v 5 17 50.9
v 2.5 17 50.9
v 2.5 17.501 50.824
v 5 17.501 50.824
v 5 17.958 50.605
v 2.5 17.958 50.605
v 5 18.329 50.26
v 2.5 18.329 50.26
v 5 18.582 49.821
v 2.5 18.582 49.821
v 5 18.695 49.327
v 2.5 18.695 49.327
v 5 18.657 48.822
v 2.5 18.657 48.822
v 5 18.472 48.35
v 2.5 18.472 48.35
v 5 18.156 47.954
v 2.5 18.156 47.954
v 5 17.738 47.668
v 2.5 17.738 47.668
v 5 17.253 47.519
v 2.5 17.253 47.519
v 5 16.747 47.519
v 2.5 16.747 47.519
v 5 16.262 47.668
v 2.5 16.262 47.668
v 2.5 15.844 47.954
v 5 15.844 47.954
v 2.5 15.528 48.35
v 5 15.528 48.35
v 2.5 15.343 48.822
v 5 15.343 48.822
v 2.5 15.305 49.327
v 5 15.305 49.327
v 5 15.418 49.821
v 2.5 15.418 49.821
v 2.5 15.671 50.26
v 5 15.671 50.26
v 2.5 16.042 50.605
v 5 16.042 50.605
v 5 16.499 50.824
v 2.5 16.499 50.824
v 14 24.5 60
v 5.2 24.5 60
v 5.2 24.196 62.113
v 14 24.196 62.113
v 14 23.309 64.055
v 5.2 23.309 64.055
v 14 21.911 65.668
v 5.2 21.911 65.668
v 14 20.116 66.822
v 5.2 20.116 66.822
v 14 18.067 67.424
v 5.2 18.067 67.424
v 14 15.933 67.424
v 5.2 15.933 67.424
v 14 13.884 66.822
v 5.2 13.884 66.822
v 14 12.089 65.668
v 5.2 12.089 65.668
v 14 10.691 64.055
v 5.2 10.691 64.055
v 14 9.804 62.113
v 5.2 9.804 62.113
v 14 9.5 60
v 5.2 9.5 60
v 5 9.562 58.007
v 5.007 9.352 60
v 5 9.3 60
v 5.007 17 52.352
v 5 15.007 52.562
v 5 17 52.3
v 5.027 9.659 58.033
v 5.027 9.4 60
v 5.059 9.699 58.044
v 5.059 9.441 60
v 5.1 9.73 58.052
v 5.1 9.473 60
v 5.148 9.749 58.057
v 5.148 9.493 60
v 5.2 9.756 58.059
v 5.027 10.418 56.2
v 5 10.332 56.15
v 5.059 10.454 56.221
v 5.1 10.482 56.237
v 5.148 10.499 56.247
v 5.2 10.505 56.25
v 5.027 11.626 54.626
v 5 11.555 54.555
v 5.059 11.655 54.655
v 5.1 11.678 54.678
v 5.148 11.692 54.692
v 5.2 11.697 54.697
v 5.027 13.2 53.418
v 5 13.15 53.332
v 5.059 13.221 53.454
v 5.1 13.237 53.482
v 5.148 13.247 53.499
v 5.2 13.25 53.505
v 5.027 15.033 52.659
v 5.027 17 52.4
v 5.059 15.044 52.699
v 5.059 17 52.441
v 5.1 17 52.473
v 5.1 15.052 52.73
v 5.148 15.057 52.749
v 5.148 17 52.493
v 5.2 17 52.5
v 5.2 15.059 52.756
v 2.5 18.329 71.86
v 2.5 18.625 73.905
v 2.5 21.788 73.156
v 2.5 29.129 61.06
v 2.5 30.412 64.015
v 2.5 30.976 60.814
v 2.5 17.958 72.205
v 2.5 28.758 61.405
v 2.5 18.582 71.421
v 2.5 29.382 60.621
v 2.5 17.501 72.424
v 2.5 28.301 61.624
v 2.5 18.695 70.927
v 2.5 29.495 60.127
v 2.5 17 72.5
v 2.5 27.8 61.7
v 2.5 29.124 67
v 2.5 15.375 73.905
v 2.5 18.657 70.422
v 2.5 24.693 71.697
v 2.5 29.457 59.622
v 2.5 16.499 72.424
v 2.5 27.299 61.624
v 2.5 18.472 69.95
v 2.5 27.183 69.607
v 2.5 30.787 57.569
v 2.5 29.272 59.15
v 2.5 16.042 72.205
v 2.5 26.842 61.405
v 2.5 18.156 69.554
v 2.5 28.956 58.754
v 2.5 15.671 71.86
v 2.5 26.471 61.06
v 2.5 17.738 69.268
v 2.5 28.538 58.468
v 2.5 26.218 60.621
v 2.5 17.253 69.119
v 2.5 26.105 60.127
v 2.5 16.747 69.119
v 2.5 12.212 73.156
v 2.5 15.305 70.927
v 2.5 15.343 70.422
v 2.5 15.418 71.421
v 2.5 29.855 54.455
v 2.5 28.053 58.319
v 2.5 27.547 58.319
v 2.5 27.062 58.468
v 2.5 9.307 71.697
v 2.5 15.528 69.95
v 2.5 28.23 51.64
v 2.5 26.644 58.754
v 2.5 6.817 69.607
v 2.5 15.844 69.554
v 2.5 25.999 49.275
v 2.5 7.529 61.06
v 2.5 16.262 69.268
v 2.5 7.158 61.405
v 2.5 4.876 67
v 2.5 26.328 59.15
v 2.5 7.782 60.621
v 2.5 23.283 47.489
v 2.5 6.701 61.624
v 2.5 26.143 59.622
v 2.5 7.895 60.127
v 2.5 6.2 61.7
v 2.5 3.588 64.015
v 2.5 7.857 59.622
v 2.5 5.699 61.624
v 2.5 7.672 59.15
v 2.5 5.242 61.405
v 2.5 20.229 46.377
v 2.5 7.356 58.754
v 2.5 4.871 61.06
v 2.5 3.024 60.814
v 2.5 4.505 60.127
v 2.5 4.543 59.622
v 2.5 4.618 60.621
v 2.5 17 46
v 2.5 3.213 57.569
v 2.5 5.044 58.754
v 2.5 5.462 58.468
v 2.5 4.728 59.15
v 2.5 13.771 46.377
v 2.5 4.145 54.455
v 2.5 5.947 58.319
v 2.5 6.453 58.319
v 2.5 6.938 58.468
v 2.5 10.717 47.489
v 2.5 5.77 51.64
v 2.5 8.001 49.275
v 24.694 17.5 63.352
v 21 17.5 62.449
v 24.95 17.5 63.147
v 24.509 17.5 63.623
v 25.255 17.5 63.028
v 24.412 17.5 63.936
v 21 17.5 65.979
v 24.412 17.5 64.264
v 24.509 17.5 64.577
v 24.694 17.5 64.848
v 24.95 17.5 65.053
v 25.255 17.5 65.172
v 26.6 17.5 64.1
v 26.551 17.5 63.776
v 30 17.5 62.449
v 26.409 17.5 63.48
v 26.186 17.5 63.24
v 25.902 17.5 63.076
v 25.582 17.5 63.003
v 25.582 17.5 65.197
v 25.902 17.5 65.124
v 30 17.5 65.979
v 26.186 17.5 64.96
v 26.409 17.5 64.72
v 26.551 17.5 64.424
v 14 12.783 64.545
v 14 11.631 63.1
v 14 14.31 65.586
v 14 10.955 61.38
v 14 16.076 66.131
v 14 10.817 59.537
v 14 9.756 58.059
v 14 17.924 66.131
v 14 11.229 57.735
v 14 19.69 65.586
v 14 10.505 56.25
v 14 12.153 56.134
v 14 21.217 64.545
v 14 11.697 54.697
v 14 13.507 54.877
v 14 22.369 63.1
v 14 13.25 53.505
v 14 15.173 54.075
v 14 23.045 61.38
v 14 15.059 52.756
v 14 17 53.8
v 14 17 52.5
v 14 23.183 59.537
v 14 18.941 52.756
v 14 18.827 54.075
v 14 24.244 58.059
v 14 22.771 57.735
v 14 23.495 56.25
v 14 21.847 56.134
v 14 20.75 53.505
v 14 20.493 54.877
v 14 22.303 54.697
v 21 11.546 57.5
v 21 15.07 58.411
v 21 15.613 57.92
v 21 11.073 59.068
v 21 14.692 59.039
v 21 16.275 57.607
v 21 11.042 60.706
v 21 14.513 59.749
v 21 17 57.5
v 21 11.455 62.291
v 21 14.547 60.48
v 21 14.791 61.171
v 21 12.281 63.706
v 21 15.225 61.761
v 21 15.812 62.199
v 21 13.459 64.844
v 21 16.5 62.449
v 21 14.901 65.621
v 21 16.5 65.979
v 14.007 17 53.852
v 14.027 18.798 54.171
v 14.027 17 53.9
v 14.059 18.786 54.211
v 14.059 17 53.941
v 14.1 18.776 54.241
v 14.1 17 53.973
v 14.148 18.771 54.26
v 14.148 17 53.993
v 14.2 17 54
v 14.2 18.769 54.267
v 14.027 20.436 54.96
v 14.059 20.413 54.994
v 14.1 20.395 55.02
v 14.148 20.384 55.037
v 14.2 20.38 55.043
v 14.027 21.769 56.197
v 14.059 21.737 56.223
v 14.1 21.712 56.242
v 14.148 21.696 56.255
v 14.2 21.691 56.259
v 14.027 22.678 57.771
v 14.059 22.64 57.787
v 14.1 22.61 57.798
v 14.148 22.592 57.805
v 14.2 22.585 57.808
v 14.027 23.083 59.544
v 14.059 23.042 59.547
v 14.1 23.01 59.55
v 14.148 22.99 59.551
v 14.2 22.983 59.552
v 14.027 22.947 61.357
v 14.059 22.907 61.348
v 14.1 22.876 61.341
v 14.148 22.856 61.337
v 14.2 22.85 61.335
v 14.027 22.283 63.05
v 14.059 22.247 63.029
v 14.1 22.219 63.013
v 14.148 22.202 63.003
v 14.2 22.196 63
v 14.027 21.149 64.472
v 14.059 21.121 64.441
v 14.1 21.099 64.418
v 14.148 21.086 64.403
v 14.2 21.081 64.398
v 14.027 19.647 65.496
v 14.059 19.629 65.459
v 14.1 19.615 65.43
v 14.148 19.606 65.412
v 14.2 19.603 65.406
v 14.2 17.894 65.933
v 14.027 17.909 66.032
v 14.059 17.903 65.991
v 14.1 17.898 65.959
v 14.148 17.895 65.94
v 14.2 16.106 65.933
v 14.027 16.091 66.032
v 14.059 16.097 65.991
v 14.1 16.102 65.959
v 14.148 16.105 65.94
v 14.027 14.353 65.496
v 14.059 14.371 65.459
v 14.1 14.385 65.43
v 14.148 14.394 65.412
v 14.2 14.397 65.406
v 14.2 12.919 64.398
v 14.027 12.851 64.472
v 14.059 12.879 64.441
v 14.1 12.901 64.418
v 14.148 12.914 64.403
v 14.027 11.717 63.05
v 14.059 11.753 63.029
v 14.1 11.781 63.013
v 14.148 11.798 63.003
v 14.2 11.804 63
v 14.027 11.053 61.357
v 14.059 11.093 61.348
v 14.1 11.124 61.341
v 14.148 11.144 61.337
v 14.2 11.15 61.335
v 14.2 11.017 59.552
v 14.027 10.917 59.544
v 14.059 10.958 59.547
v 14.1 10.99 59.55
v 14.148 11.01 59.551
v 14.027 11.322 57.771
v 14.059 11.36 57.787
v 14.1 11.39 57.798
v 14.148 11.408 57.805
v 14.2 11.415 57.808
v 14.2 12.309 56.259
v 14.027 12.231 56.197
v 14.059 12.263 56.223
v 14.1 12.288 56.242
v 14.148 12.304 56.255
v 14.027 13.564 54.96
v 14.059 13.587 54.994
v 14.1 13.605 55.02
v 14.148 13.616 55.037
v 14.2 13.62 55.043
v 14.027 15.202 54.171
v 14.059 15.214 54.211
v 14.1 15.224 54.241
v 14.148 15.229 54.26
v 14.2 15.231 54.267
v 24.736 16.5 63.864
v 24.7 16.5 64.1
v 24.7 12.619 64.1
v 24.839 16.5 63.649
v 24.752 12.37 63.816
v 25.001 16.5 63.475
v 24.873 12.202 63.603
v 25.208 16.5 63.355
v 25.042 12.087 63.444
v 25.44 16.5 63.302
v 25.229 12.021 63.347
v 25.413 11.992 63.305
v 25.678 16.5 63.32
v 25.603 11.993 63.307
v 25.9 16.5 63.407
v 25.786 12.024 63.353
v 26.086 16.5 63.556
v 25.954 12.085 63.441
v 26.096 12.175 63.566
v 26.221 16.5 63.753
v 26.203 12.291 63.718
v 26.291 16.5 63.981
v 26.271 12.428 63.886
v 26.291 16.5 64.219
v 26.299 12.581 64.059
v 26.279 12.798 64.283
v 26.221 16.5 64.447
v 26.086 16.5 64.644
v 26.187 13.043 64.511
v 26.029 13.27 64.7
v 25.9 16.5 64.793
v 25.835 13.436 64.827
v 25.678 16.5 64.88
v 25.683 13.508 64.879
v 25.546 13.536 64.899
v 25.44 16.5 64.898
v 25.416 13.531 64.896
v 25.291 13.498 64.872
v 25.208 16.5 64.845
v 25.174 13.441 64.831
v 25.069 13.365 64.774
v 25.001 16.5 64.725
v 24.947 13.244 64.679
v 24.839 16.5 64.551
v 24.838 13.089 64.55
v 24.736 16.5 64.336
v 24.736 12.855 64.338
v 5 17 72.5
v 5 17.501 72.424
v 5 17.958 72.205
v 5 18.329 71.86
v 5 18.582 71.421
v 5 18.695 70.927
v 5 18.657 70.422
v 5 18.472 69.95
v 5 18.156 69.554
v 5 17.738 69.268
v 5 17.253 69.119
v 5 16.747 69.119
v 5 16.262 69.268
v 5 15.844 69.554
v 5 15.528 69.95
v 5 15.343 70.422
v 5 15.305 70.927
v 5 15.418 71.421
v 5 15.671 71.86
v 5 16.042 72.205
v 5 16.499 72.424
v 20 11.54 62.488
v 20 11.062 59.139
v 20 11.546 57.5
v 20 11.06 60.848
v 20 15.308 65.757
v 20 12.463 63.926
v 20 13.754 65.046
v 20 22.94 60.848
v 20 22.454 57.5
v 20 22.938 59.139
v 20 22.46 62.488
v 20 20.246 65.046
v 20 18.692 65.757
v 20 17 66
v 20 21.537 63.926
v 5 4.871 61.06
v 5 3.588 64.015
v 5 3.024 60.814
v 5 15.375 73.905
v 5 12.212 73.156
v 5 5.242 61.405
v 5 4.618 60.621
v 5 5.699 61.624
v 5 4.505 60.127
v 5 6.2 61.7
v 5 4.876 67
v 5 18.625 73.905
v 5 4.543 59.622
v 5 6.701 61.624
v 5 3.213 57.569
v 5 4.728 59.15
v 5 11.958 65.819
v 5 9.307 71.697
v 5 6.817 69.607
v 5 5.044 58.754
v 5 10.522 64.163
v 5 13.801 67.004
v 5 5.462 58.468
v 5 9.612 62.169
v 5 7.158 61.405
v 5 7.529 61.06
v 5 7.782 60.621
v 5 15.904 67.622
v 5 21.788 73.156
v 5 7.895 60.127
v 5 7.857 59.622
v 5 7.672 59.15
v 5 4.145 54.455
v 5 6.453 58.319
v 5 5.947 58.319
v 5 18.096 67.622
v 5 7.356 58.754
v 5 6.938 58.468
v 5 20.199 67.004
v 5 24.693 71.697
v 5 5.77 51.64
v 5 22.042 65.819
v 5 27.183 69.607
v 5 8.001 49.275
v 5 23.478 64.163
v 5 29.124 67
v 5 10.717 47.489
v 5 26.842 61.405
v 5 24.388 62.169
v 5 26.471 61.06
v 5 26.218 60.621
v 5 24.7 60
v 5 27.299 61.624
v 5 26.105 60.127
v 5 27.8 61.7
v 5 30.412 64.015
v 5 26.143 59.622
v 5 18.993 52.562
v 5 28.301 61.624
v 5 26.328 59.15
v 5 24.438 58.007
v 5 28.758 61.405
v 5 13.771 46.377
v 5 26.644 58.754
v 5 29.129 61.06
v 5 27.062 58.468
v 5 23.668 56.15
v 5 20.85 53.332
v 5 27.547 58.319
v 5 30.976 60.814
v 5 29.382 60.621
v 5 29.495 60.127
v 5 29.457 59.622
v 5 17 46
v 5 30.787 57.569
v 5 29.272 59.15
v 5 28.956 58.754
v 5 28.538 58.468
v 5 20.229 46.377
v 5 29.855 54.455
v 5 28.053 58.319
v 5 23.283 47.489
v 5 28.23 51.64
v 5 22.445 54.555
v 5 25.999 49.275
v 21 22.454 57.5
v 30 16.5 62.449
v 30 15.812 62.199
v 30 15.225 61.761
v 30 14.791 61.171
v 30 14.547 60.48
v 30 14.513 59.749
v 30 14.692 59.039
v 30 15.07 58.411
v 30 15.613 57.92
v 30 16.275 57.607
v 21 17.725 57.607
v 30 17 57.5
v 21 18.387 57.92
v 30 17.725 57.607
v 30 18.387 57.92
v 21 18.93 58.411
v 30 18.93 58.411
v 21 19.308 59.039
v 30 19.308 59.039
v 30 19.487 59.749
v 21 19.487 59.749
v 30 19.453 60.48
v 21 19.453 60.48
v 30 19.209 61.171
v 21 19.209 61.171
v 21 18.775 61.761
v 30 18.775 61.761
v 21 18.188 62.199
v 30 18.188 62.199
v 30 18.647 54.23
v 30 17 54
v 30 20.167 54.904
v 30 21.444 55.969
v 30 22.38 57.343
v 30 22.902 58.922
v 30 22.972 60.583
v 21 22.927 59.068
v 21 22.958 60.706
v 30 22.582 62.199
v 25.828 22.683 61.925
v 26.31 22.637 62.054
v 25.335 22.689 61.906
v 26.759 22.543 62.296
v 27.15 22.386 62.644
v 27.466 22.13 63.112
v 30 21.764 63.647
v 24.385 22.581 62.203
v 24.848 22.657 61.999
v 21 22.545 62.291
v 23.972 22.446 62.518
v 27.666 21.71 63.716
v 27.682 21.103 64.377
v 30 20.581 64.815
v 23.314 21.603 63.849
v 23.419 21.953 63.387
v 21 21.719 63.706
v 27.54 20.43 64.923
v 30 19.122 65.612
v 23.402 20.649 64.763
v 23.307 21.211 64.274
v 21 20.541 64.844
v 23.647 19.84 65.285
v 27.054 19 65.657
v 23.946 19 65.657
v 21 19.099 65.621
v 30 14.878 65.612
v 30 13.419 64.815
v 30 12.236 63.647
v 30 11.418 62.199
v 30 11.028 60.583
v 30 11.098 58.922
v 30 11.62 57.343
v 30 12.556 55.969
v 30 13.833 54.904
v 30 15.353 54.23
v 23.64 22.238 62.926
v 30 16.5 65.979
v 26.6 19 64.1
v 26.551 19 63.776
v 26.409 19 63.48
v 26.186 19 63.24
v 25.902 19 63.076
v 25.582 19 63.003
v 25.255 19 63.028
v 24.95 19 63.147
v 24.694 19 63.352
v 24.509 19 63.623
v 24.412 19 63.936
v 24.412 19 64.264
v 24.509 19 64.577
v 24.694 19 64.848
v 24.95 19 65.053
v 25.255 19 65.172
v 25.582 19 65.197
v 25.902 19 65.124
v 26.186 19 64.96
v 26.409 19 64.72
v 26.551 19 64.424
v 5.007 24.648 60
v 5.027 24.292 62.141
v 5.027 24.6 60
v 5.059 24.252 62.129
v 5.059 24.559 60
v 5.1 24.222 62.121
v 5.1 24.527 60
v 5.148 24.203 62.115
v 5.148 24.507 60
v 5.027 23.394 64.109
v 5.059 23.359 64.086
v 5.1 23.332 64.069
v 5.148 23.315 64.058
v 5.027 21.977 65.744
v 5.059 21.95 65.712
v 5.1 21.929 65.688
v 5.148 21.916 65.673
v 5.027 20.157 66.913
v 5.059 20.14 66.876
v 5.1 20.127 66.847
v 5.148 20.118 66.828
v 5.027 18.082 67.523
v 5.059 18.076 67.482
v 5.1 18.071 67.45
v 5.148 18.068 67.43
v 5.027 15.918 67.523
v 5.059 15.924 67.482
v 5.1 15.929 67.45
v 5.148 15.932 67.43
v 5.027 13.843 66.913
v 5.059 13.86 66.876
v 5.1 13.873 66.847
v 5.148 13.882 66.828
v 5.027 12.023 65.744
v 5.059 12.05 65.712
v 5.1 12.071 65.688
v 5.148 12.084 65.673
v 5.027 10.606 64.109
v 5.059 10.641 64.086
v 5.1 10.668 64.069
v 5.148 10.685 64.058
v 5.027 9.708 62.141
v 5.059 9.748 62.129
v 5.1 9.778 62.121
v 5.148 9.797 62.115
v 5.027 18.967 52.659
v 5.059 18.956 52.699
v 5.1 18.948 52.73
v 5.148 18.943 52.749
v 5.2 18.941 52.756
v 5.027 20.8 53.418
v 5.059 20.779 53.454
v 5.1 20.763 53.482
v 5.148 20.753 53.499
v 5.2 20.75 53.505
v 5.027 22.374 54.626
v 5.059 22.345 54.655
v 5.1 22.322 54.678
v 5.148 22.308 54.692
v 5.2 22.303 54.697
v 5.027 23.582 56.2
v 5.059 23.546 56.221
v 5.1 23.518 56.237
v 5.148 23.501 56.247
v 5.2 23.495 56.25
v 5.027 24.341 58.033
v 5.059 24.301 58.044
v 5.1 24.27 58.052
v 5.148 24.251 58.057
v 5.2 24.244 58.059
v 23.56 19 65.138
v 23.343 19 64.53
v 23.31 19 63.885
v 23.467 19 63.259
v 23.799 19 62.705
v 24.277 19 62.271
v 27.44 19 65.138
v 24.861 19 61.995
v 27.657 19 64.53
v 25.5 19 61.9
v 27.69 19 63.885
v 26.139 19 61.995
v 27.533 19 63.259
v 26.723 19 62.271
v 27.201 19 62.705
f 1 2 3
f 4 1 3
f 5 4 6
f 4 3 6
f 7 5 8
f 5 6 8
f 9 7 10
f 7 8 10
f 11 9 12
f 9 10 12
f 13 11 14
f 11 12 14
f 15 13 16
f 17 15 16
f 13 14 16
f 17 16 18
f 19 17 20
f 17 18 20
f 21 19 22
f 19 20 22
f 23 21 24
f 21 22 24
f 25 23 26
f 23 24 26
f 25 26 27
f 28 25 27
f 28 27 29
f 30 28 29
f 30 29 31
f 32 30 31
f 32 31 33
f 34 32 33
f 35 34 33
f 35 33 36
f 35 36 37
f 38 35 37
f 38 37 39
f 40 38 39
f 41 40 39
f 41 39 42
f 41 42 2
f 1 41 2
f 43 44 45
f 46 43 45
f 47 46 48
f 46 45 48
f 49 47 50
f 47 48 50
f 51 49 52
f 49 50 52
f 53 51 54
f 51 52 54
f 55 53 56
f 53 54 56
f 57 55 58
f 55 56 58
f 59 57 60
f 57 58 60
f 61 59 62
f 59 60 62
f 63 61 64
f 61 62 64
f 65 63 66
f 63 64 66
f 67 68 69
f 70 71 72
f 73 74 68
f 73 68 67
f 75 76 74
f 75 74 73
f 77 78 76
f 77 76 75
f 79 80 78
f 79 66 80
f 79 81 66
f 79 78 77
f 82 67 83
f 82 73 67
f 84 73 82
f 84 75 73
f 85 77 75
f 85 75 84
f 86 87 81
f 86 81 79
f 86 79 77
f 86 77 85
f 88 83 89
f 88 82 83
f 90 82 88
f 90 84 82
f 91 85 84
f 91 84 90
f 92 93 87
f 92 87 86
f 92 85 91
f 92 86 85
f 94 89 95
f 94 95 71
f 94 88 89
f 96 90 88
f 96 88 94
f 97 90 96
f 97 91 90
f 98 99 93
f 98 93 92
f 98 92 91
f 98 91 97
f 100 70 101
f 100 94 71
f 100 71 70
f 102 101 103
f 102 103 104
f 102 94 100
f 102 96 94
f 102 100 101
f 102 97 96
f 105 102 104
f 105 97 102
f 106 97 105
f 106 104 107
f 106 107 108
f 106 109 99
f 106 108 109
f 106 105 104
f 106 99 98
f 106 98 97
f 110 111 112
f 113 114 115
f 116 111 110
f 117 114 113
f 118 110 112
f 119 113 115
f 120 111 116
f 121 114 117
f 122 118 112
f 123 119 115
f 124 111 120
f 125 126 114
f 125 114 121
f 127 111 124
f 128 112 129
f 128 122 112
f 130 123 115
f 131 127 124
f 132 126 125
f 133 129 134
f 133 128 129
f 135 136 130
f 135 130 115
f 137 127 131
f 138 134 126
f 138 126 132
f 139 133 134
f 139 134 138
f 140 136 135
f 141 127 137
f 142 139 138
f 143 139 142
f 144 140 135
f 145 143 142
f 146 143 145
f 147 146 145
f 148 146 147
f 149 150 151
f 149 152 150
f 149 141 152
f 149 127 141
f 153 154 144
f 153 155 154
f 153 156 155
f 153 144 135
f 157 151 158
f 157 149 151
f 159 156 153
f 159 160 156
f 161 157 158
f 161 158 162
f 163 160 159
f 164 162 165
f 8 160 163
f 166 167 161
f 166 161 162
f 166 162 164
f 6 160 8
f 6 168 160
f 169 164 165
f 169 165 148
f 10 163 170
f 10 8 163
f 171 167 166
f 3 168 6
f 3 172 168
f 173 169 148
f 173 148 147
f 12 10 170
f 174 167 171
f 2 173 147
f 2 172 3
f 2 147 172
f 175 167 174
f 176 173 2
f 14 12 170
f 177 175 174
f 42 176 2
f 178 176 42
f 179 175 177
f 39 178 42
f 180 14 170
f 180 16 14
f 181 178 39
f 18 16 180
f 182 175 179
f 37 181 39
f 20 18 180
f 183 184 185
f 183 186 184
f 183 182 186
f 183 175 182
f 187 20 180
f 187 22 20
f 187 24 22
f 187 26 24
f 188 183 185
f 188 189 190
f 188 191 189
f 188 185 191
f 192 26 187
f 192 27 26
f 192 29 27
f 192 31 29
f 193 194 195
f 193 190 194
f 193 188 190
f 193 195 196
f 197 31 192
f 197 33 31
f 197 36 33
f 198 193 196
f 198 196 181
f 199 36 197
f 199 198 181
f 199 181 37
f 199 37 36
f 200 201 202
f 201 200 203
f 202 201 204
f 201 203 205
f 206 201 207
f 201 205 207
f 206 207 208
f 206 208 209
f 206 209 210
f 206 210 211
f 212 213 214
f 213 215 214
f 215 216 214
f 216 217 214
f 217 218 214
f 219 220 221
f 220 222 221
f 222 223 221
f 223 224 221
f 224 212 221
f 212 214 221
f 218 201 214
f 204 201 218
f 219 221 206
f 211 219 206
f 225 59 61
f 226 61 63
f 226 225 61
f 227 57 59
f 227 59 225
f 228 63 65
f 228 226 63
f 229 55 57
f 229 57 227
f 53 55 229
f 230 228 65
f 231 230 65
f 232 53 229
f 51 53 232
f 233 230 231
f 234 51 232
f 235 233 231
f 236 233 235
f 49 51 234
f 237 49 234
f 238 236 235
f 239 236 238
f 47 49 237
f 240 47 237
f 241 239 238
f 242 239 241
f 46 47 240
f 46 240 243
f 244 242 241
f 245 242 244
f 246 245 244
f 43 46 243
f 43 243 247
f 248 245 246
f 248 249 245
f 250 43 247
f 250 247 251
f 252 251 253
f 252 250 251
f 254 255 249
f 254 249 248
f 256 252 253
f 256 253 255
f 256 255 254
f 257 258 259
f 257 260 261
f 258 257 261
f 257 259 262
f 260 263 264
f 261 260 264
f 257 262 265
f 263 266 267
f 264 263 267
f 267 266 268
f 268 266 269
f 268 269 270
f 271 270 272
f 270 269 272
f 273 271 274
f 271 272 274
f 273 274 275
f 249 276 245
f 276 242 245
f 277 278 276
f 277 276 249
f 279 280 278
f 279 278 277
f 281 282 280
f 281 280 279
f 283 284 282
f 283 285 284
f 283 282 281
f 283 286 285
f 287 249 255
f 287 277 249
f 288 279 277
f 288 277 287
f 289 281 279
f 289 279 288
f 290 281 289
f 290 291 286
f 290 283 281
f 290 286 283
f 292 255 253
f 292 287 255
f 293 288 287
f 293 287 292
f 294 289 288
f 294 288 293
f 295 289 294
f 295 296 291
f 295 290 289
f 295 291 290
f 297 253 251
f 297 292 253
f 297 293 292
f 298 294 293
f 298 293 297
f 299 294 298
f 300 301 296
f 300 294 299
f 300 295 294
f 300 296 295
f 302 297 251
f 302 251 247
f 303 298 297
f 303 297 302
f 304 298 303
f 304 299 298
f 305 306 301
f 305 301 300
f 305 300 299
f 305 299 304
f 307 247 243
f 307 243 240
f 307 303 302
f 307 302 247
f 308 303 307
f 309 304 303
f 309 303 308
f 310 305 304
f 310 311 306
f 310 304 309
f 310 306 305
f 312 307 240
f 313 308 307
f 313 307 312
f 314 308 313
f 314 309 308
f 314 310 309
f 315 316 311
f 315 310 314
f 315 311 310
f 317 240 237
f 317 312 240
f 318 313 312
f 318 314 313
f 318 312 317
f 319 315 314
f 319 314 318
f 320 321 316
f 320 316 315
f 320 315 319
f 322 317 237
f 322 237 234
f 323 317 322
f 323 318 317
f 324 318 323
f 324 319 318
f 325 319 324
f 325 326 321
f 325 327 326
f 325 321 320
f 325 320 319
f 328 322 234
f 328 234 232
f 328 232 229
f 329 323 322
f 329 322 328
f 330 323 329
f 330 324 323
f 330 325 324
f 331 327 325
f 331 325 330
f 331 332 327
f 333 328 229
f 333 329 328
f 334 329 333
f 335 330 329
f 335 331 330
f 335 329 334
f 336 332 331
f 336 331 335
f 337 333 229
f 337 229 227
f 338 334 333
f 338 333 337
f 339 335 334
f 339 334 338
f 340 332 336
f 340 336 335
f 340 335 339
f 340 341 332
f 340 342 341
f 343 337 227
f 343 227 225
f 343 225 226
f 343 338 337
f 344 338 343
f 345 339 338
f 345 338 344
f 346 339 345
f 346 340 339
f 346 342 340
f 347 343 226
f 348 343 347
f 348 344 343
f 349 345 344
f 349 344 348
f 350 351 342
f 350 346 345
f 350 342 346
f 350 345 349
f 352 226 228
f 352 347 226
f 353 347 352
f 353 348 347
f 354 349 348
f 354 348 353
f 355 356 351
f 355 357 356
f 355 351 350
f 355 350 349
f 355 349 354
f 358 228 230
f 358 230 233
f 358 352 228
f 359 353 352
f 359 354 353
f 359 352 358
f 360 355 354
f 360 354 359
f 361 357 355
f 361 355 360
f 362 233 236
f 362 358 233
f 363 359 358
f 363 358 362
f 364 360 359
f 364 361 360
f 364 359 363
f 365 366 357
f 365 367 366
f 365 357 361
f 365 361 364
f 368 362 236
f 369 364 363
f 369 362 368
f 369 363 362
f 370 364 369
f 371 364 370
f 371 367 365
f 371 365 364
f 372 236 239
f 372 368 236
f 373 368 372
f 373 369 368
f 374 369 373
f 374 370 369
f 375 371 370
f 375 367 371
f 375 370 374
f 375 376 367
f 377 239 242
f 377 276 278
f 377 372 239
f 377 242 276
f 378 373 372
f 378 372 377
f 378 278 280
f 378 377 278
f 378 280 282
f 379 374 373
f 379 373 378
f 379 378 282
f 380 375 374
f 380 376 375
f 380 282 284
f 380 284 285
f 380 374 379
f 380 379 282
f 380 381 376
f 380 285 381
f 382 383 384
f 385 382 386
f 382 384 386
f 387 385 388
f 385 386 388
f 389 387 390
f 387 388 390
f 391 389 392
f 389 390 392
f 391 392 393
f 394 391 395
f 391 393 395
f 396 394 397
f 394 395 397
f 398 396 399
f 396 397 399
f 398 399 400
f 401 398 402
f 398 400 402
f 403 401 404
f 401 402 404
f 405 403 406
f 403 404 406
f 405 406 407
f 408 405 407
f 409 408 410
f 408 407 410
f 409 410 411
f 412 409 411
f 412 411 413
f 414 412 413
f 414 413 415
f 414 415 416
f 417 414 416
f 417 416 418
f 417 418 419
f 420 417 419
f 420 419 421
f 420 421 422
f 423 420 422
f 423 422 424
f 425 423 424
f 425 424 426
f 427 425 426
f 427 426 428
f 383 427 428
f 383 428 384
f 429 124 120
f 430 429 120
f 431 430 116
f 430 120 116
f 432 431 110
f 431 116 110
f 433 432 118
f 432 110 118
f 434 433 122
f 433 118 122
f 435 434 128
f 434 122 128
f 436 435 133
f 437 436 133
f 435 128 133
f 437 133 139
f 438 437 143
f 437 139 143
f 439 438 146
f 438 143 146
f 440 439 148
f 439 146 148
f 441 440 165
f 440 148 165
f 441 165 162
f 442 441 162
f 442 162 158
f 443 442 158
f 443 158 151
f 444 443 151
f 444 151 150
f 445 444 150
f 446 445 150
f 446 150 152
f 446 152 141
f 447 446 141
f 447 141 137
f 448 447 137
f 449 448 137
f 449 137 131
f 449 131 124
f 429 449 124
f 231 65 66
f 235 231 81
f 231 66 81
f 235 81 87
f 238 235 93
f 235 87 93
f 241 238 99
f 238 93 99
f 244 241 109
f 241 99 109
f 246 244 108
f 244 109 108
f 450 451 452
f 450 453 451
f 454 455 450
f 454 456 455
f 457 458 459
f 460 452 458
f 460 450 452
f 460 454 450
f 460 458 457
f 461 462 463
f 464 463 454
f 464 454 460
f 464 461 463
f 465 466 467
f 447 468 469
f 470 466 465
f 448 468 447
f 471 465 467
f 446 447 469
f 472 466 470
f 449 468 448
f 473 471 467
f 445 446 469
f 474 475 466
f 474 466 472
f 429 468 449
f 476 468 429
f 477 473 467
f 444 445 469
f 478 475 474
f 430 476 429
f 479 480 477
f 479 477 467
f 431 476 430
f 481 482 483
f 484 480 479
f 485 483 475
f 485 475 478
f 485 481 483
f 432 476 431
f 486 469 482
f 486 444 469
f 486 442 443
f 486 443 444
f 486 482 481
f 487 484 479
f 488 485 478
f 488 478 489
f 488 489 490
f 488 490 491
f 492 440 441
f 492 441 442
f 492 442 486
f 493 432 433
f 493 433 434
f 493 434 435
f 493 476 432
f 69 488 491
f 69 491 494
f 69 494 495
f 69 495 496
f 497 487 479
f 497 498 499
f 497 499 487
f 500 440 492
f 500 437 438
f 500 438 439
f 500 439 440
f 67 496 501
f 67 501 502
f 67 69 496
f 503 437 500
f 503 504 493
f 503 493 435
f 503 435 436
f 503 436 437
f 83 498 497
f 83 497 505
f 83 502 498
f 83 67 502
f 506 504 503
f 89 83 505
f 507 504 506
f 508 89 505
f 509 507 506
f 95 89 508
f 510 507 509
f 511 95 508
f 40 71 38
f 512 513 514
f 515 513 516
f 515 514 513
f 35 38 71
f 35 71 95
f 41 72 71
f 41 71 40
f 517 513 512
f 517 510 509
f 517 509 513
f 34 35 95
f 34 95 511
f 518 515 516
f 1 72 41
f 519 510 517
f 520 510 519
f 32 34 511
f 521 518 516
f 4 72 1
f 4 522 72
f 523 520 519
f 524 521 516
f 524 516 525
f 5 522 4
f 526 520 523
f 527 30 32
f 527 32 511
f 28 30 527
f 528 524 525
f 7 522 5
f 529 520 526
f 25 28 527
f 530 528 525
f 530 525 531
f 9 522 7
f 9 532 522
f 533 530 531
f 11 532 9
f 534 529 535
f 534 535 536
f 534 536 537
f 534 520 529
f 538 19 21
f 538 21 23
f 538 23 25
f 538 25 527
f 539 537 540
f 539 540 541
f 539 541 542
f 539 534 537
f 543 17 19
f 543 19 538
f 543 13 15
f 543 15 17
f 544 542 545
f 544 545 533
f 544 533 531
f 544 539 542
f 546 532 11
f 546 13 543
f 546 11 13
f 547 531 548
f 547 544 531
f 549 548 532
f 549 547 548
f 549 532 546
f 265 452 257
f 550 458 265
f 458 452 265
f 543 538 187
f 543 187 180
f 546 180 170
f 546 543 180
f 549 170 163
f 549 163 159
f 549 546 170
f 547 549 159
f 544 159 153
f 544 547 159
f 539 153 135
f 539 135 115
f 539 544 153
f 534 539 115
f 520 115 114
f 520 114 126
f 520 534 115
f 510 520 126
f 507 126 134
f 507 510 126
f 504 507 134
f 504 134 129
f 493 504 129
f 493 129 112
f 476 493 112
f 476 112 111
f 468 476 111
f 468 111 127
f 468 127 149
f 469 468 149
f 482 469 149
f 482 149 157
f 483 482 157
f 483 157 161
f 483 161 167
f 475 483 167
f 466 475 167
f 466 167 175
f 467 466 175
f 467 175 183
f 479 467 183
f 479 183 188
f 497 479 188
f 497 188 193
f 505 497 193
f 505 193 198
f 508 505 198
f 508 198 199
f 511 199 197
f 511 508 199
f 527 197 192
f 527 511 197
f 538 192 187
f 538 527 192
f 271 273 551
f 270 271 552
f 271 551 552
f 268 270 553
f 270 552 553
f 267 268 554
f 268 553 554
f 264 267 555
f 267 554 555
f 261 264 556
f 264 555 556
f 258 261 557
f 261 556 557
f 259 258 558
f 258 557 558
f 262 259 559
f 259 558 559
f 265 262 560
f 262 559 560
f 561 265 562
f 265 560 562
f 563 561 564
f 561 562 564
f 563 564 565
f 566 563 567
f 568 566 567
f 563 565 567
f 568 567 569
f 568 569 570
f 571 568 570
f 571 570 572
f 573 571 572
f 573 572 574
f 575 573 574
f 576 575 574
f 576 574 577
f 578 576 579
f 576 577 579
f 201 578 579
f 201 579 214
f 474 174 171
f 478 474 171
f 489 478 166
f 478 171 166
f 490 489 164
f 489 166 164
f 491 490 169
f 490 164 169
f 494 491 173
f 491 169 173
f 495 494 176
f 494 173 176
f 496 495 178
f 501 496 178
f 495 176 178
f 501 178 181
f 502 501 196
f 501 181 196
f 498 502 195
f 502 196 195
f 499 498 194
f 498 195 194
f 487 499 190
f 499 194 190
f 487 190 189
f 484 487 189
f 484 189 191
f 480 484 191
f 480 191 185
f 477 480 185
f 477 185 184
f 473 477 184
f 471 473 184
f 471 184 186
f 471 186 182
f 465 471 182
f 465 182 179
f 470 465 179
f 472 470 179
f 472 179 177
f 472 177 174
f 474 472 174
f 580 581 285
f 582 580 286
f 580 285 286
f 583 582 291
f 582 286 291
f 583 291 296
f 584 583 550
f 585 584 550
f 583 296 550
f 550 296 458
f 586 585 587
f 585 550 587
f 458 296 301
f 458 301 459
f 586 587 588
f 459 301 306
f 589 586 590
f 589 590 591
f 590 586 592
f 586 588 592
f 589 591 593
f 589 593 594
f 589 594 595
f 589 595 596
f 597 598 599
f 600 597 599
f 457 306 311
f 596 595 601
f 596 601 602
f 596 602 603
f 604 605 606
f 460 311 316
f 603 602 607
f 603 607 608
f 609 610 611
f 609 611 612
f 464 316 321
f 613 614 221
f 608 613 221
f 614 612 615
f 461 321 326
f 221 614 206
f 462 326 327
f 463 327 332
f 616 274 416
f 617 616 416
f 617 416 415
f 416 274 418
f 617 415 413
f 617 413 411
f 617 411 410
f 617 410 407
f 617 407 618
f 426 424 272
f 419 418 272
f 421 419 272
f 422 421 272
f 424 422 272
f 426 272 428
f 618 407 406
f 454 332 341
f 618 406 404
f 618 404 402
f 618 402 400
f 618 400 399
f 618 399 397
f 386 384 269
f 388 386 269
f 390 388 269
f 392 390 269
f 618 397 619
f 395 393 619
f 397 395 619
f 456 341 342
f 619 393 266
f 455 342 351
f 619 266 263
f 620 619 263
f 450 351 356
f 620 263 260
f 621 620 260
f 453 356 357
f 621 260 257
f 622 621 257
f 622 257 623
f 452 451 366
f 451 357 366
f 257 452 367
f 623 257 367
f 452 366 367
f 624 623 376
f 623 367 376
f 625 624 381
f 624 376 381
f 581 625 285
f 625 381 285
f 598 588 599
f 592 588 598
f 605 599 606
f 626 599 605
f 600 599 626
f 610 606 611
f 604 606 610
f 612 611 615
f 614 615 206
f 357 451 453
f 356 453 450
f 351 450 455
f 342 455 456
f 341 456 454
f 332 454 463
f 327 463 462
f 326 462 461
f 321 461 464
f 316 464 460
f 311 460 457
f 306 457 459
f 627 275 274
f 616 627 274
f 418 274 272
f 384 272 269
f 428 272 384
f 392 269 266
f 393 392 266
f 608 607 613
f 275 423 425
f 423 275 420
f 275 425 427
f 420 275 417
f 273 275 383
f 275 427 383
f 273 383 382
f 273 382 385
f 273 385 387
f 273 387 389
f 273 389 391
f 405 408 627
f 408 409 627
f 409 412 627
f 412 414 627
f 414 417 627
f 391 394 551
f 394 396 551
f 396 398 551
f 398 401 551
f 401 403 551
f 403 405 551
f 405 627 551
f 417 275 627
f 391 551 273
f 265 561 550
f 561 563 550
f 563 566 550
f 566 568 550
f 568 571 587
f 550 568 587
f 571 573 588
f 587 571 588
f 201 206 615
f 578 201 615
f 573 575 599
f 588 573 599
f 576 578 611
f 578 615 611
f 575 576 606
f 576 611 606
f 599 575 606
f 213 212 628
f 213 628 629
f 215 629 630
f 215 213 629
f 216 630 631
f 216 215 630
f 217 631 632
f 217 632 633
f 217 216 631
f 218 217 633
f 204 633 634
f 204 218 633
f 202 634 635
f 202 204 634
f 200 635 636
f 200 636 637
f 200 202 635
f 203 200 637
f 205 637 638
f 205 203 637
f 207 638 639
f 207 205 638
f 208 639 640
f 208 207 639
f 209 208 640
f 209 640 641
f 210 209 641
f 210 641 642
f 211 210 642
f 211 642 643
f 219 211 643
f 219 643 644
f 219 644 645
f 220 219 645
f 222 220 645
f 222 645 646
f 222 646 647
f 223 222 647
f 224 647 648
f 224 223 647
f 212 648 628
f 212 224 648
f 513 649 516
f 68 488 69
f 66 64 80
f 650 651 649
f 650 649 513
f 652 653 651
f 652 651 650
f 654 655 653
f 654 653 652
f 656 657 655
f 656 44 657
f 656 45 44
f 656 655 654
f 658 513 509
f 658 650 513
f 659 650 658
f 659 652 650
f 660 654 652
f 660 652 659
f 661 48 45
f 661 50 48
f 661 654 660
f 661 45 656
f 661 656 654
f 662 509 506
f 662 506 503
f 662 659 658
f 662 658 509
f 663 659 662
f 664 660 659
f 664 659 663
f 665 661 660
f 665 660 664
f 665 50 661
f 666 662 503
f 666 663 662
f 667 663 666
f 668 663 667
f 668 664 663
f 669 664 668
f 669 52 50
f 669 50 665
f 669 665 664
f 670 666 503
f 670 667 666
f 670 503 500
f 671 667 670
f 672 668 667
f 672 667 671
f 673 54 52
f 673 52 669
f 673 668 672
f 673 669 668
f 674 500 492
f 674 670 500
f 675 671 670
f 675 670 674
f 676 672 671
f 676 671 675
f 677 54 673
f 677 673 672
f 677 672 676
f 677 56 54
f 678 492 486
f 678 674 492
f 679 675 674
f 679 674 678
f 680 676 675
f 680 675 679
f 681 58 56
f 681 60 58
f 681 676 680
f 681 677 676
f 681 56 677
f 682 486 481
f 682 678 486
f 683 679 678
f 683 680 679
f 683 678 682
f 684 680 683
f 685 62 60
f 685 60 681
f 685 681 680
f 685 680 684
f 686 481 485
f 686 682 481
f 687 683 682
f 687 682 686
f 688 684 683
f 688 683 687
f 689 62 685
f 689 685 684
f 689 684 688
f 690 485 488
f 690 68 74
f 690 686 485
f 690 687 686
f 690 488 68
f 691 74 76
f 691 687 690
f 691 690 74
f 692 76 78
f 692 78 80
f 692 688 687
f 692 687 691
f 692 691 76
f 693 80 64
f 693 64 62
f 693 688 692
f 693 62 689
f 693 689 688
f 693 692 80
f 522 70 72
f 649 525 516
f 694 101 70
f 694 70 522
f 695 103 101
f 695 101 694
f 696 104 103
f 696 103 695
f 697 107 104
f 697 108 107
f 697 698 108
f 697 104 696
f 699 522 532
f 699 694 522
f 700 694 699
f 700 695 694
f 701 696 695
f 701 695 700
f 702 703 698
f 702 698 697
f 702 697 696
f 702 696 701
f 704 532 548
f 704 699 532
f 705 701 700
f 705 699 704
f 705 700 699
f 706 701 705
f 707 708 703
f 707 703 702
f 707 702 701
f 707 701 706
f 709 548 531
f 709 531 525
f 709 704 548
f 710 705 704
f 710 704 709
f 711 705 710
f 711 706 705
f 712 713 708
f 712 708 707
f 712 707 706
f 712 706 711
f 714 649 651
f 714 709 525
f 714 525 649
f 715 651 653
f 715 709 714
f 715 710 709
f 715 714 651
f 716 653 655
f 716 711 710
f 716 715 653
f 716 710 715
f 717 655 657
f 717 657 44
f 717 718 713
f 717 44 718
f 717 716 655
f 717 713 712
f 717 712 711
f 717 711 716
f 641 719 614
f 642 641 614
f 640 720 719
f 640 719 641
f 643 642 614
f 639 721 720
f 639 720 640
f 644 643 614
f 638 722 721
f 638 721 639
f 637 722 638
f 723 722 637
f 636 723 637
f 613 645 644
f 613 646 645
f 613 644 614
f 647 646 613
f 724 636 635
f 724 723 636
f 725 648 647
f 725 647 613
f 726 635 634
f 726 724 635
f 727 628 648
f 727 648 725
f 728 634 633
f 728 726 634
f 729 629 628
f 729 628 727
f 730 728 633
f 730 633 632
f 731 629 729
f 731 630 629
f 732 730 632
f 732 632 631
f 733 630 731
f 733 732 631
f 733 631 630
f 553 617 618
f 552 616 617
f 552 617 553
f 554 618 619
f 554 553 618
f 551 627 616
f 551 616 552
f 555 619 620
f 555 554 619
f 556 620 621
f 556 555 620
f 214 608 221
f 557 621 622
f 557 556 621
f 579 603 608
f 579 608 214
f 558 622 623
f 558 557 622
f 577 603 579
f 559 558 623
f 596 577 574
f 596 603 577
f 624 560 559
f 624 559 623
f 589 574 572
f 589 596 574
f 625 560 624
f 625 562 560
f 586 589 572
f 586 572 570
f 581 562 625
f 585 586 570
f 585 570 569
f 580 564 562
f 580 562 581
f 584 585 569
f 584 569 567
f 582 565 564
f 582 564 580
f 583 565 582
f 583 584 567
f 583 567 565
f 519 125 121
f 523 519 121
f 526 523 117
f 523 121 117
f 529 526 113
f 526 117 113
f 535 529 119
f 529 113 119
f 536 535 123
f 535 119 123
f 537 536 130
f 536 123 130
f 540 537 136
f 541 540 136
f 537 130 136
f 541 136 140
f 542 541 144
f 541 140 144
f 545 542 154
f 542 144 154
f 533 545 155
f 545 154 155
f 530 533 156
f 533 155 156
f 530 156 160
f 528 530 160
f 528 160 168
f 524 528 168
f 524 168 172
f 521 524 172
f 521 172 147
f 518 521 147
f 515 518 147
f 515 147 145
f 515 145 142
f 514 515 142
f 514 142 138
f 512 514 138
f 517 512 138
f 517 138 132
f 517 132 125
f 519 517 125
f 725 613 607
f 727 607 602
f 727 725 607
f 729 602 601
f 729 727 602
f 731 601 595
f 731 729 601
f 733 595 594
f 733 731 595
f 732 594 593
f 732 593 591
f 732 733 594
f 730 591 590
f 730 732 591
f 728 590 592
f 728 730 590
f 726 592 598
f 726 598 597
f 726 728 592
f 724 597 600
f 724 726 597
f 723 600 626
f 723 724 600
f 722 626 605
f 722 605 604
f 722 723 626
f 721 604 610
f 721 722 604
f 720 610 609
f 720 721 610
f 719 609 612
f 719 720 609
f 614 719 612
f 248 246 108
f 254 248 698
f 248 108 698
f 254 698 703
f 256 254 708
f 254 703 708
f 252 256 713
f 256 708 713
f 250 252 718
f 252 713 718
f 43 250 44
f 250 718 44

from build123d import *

# Parameters (mm, degrees)
SKETCH1_W                                     = 120
SKETCH1_H                                     = 34
BOSS_EXTRUDE1_DEPTH                           = 5
BOSS_EXTRUDE2_DEPTH                           = 9
SKETCH3_R                                     = 6
BOSS_EXTRUDE3_DEPTH                           = 16
CUT_EXTRUDE1_DEPTH                            = 9
SKETCH5_W                                     = 1
SKETCH5_H                                     = 12
CUT_EXTRUDE2_DEPTH                            = 8.5
CBORE_START                                   = 19
CBORE_FOR_M2_HEX_SOCKET_HEAD_CAP_SCREW1_DEPTH = 3.691221609
CBORE_START_2                                 = 17.5
CBORE_FOR_M2_HEX_SOCKET_HEAD_CAP_SCR_3_O_R    = 1.1
CBORE_FOR_M2_HEX_SOCKET_HEAD_CAP_SCR_3_DEPTH  = 1.5
M2_TAPPED_HOLE1_D                             = 1.6
FILLET1_R                                     = 0.2
SKETCH12_W                                    = 120
SKETCH12_H                                    = 34
SKETCH12_R                                    = 14
CUT_EXTRUDE3_DEPTH                            = 10
CUT_EXTRUDE4_DEPTH                            = 83.316462545
CUT_EXTRUDE4_DEPTH_BACK                       = 83.316462545
SKETCH13_W                                    = 2.5
SKETCH13_H                                    = 28
M3_CLEARANCE_HOLE1_D                          = 3.4
M3_CLEARANCE_HOLE1_DEPTH                      = 15
M3_CLEARANCE_HOLE1_TIP                        = 1.021463052


# Read off the part's stored shape, not the designer's step: CBORE for M2 Hex Socket Head Cap Screw1
with BuildPart() as part:
    # Sketch1 → Boss-Extrude1 (new body)
    with BuildSketch(Plane(origin=(0, 0, 0), x_dir=(0, 0, -1), z_dir=(1, 0, 0))):
        with Locations((-60, 17)):
            Rectangle(SKETCH1_W, SKETCH1_H)
    extrude(amount=BOSS_EXTRUDE1_DEPTH)

    # Sketch2 → Boss-Extrude2 (add)
    with BuildSketch(Plane(origin=(5, 0, 0), x_dir=(0, 0, -1), z_dir=(1, 0, 0))):
        with BuildLine():
            ThreePointArc((-52.5, 17), (-54.696699141, 22.303300859), (-60, 24.5))
            Line((-60, 24.5), (-60, 9.5))
            ThreePointArc((-60, 9.5), (-54.696699141, 11.696699141), (-52.5, 17))
        make_face()
        with BuildLine():
            Line((-60, 9.5), (-60, 24.5))
            ThreePointArc((-60, 24.5), (-67.5, 17), (-60, 9.5))
        make_face()
    extrude(amount=BOSS_EXTRUDE2_DEPTH)

    # Sketch3 → Boss-Extrude3 (add)
    with BuildSketch(Plane(origin=(14, 0, 0), x_dir=(0, 0, -1), z_dir=(1, 0, 0))):
        with Locations((-60, 17)):
            Circle(SKETCH3_R)
    extrude(amount=BOSS_EXTRUDE3_DEPTH)

    # Sketch4 → Cut-Extrude1 (cut)
    with BuildSketch(Plane(origin=(30, 0, 0), x_dir=(0, 0, -1), z_dir=(1, 0, 0))):
        with BuildLine():
            Line((-62.449489743, 17.5), (-67.449489743, 17.5))
            Line((-67.449489743, 17.5), (-67.449489743, 16.5))
            Line((-67.449489743, 16.5), (-62.449489743, 16.5))
            ThreePointArc((-62.449489743, 16.5), (-57.5, 17), (-62.449489743, 17.5))
        make_face()
    extrude(amount=-CUT_EXTRUDE1_DEPTH, mode=Mode.SUBTRACT)

    # Sketch5 → Cut-Extrude2 (cut)
    with BuildSketch(Plane.XY.offset(66)):
        with Locations((20.5, 17)):
            Rectangle(SKETCH5_W, SKETCH5_H)
    extrude(amount=-CUT_EXTRUDE2_DEPTH, mode=Mode.SUBTRACT)

    # CBORE for M2 Hex Socket Head Cap Scr 2 → CBORE for M2 Hex Socket Head Cap Screw1 (cut)
    with BuildSketch(Plane(origin=(0, 0, 0), x_dir=(1, 0, 0), z_dir=(0, 1, 0)).offset(CBORE_START)):
        with BuildLine():
            Line((25.709160843, -67), (27.054414631, -65.656854249))
            ThreePointArc((27.054414631, -65.656854249), (25.5, -61.9), (23.945585369, -65.656854249))
            Line((23.945585369, -65.656854249), (25.290839157, -67))
            Line((25.290839157, -67), (25.709160843, -67))
        make_face()
    extrude(amount=CBORE_FOR_M2_HEX_SOCKET_HEAD_CAP_SCREW1_DEPTH, mode=Mode.SUBTRACT)

    # CBORE for M2 Hex Socket Head Cap Scr 3 o → CBORE for M2 Hex Socket Head Cap Scr 3 (cut)
    with BuildSketch(Plane(origin=(0, 0, 0), x_dir=(1, 0, 0), z_dir=(0, 1, 0)).offset(CBORE_START_2)):
        with Locations((25.5, -64.1)):
            Circle(CBORE_FOR_M2_HEX_SOCKET_HEAD_CAP_SCR_3_O_R)
    extrude(amount=CBORE_FOR_M2_HEX_SOCKET_HEAD_CAP_SCR_3_DEPTH, mode=Mode.SUBTRACT)

    # M2 Tapped Hole1 (through all)
    with Locations(Plane(origin=(0, 16.5, 0), x_dir=(1, 0, 0), z_dir=(0, 1, 0))):
        with Locations((25.5, -64.1)):
            Hole(M2_TAPPED_HOLE1_D / 2)

    # Fillet1
    fillet1_edges = [part.edges().sort_by_distance(p)[0] for p in [
        (5, 24.5, 60),
        (14, 17, 66),
    ]]
    fillet(fillet1_edges, radius=FILLET1_R)

    # Sketch12 → Cut-Extrude3 (cut)
    with BuildSketch(Plane(origin=(5, 0, 0), x_dir=(0, 0, -1), z_dir=(1, 0, 0))):
        with Locations((-60, 17)):
            Rectangle(SKETCH12_W, SKETCH12_H)
        with Locations((-60, 17)):
            Circle(SKETCH12_R, mode=Mode.SUBTRACT)
    extrude(amount=-CUT_EXTRUDE3_DEPTH, mode=Mode.SUBTRACT)

    # Sketch13 → Cut-Extrude4 (cut, two sides: drawn at the far end of the back side and taken through both)
    with BuildSketch(Plane(origin=(0, 23, 0), x_dir=(1, 0, 0), z_dir=(0, 1, 0)).offset(-CUT_EXTRUDE4_DEPTH_BACK)):
        with Locations((1.25, -60)):
            Rectangle(SKETCH13_W, SKETCH13_H)
    extrude(amount=CUT_EXTRUDE4_DEPTH + CUT_EXTRUDE4_DEPTH_BACK, mode=Mode.SUBTRACT)

    # M3 Clearance Hole1
    with Locations(Plane(origin=(5, 0, 0), x_dir=(0, 0, -1), z_dir=(1, 0, 0))):
        with Locations((-60, 27.8), (-49.2, 17), (-60, 6.2), (-70.8, 17)):
            Hole(M3_CLEARANCE_HOLE1_D / 2, depth=M3_CLEARANCE_HOLE1_DEPTH)
            with Locations((0, 0, -(M3_CLEARANCE_HOLE1_DEPTH + M3_CLEARANCE_HOLE1_TIP / 2))):  # 118° drill point
                Cone(0, M3_CLEARANCE_HOLE1_D / 2, M3_CLEARANCE_HOLE1_TIP, mode=Mode.SUBTRACT)


solid = part.part
